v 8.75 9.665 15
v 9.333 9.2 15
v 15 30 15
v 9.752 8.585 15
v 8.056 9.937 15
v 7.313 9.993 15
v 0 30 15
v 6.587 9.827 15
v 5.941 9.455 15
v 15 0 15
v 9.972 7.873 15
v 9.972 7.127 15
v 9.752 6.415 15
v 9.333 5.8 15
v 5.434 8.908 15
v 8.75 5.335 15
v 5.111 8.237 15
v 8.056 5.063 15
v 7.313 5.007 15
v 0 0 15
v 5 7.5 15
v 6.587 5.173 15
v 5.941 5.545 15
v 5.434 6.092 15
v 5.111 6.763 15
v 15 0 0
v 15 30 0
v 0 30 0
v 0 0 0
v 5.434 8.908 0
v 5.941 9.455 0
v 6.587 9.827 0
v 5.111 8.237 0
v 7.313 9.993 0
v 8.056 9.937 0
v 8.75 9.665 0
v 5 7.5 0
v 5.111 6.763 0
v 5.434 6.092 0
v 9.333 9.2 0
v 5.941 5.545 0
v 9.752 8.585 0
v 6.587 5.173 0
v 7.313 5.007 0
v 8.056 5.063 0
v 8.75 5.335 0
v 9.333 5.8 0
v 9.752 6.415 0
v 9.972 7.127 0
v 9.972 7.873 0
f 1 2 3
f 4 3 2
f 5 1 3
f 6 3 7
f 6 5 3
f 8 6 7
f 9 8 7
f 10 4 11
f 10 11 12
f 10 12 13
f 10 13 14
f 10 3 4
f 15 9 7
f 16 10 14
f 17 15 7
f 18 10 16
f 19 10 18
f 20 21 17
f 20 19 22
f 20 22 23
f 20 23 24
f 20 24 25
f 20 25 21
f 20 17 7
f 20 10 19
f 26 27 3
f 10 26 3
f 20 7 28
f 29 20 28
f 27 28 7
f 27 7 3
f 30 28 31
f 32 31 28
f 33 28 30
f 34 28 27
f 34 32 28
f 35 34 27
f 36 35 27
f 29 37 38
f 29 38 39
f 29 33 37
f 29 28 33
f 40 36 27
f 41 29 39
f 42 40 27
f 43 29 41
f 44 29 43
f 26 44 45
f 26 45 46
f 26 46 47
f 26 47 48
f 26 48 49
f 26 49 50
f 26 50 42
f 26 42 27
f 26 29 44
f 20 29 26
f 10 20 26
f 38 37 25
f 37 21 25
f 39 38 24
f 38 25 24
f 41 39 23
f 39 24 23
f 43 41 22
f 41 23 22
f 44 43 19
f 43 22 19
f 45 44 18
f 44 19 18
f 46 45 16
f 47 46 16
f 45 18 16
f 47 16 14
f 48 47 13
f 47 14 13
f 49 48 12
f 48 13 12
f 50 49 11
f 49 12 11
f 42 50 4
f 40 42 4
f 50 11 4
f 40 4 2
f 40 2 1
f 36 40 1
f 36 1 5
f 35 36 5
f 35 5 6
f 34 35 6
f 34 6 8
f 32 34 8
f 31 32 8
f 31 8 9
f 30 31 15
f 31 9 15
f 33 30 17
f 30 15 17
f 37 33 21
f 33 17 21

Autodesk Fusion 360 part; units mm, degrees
sketch "Sketch1" plane through (0, 0, 0) normal (0, 1, 0) x (1, 0, 0)
  line L0 (0, 0) -> (15, 0)
  line L1 (15, 0) -> (15, -15)
  line L2 (15, -15) -> (0, -15)
  line L3 (0, -15) -> (0, 0)
  dimension "d1" = 15
  dimension "d2" = 15
extrude "Extrude1" add sketch "Sketch1" along normal blind 30
sketch "Sketch3" plane through (0, 0, 15) normal (0, 0, 1) x (-1, 0, 0)
  line L0 (0, 0) -> (-15, 0)
  line L1 (-15, 0) -> (-15, -30)
  line L2 (-15, -30) -> (0, -30)
  line L3 (0, -30) -> (0, 0)
  line L4 (0, 0) -> (-9.4343, 0)
  line L5 (-9.4343, 0) -> (-9.4343, -2.5)
  line L6 (-9.4343, -2.5) -> (0, -2.5)
  line L7 (0, -2.5) -> (0, 0)
  line L8 (0, 0) -> (-7.5, 0)
  line L9 (-7.5, 0) -> (-7.5, -11.3998)
  line L10 (-7.5, -11.3998) -> (-7.5, -2.5)
  line L11 (-7.5, -2.5) -> (-7.5, -7.5)
  circle A0 centre (-7.5, -7.5) radius 2.5
  dimension "d13" = 2.5
  dimension "d14" = 5
  dimension "d15" = 5
extrude "Extrude3" cut sketch "Sketch3" against normal blind 34 contours L9 L10 L11 A0 | L9 L10 L11 A0
